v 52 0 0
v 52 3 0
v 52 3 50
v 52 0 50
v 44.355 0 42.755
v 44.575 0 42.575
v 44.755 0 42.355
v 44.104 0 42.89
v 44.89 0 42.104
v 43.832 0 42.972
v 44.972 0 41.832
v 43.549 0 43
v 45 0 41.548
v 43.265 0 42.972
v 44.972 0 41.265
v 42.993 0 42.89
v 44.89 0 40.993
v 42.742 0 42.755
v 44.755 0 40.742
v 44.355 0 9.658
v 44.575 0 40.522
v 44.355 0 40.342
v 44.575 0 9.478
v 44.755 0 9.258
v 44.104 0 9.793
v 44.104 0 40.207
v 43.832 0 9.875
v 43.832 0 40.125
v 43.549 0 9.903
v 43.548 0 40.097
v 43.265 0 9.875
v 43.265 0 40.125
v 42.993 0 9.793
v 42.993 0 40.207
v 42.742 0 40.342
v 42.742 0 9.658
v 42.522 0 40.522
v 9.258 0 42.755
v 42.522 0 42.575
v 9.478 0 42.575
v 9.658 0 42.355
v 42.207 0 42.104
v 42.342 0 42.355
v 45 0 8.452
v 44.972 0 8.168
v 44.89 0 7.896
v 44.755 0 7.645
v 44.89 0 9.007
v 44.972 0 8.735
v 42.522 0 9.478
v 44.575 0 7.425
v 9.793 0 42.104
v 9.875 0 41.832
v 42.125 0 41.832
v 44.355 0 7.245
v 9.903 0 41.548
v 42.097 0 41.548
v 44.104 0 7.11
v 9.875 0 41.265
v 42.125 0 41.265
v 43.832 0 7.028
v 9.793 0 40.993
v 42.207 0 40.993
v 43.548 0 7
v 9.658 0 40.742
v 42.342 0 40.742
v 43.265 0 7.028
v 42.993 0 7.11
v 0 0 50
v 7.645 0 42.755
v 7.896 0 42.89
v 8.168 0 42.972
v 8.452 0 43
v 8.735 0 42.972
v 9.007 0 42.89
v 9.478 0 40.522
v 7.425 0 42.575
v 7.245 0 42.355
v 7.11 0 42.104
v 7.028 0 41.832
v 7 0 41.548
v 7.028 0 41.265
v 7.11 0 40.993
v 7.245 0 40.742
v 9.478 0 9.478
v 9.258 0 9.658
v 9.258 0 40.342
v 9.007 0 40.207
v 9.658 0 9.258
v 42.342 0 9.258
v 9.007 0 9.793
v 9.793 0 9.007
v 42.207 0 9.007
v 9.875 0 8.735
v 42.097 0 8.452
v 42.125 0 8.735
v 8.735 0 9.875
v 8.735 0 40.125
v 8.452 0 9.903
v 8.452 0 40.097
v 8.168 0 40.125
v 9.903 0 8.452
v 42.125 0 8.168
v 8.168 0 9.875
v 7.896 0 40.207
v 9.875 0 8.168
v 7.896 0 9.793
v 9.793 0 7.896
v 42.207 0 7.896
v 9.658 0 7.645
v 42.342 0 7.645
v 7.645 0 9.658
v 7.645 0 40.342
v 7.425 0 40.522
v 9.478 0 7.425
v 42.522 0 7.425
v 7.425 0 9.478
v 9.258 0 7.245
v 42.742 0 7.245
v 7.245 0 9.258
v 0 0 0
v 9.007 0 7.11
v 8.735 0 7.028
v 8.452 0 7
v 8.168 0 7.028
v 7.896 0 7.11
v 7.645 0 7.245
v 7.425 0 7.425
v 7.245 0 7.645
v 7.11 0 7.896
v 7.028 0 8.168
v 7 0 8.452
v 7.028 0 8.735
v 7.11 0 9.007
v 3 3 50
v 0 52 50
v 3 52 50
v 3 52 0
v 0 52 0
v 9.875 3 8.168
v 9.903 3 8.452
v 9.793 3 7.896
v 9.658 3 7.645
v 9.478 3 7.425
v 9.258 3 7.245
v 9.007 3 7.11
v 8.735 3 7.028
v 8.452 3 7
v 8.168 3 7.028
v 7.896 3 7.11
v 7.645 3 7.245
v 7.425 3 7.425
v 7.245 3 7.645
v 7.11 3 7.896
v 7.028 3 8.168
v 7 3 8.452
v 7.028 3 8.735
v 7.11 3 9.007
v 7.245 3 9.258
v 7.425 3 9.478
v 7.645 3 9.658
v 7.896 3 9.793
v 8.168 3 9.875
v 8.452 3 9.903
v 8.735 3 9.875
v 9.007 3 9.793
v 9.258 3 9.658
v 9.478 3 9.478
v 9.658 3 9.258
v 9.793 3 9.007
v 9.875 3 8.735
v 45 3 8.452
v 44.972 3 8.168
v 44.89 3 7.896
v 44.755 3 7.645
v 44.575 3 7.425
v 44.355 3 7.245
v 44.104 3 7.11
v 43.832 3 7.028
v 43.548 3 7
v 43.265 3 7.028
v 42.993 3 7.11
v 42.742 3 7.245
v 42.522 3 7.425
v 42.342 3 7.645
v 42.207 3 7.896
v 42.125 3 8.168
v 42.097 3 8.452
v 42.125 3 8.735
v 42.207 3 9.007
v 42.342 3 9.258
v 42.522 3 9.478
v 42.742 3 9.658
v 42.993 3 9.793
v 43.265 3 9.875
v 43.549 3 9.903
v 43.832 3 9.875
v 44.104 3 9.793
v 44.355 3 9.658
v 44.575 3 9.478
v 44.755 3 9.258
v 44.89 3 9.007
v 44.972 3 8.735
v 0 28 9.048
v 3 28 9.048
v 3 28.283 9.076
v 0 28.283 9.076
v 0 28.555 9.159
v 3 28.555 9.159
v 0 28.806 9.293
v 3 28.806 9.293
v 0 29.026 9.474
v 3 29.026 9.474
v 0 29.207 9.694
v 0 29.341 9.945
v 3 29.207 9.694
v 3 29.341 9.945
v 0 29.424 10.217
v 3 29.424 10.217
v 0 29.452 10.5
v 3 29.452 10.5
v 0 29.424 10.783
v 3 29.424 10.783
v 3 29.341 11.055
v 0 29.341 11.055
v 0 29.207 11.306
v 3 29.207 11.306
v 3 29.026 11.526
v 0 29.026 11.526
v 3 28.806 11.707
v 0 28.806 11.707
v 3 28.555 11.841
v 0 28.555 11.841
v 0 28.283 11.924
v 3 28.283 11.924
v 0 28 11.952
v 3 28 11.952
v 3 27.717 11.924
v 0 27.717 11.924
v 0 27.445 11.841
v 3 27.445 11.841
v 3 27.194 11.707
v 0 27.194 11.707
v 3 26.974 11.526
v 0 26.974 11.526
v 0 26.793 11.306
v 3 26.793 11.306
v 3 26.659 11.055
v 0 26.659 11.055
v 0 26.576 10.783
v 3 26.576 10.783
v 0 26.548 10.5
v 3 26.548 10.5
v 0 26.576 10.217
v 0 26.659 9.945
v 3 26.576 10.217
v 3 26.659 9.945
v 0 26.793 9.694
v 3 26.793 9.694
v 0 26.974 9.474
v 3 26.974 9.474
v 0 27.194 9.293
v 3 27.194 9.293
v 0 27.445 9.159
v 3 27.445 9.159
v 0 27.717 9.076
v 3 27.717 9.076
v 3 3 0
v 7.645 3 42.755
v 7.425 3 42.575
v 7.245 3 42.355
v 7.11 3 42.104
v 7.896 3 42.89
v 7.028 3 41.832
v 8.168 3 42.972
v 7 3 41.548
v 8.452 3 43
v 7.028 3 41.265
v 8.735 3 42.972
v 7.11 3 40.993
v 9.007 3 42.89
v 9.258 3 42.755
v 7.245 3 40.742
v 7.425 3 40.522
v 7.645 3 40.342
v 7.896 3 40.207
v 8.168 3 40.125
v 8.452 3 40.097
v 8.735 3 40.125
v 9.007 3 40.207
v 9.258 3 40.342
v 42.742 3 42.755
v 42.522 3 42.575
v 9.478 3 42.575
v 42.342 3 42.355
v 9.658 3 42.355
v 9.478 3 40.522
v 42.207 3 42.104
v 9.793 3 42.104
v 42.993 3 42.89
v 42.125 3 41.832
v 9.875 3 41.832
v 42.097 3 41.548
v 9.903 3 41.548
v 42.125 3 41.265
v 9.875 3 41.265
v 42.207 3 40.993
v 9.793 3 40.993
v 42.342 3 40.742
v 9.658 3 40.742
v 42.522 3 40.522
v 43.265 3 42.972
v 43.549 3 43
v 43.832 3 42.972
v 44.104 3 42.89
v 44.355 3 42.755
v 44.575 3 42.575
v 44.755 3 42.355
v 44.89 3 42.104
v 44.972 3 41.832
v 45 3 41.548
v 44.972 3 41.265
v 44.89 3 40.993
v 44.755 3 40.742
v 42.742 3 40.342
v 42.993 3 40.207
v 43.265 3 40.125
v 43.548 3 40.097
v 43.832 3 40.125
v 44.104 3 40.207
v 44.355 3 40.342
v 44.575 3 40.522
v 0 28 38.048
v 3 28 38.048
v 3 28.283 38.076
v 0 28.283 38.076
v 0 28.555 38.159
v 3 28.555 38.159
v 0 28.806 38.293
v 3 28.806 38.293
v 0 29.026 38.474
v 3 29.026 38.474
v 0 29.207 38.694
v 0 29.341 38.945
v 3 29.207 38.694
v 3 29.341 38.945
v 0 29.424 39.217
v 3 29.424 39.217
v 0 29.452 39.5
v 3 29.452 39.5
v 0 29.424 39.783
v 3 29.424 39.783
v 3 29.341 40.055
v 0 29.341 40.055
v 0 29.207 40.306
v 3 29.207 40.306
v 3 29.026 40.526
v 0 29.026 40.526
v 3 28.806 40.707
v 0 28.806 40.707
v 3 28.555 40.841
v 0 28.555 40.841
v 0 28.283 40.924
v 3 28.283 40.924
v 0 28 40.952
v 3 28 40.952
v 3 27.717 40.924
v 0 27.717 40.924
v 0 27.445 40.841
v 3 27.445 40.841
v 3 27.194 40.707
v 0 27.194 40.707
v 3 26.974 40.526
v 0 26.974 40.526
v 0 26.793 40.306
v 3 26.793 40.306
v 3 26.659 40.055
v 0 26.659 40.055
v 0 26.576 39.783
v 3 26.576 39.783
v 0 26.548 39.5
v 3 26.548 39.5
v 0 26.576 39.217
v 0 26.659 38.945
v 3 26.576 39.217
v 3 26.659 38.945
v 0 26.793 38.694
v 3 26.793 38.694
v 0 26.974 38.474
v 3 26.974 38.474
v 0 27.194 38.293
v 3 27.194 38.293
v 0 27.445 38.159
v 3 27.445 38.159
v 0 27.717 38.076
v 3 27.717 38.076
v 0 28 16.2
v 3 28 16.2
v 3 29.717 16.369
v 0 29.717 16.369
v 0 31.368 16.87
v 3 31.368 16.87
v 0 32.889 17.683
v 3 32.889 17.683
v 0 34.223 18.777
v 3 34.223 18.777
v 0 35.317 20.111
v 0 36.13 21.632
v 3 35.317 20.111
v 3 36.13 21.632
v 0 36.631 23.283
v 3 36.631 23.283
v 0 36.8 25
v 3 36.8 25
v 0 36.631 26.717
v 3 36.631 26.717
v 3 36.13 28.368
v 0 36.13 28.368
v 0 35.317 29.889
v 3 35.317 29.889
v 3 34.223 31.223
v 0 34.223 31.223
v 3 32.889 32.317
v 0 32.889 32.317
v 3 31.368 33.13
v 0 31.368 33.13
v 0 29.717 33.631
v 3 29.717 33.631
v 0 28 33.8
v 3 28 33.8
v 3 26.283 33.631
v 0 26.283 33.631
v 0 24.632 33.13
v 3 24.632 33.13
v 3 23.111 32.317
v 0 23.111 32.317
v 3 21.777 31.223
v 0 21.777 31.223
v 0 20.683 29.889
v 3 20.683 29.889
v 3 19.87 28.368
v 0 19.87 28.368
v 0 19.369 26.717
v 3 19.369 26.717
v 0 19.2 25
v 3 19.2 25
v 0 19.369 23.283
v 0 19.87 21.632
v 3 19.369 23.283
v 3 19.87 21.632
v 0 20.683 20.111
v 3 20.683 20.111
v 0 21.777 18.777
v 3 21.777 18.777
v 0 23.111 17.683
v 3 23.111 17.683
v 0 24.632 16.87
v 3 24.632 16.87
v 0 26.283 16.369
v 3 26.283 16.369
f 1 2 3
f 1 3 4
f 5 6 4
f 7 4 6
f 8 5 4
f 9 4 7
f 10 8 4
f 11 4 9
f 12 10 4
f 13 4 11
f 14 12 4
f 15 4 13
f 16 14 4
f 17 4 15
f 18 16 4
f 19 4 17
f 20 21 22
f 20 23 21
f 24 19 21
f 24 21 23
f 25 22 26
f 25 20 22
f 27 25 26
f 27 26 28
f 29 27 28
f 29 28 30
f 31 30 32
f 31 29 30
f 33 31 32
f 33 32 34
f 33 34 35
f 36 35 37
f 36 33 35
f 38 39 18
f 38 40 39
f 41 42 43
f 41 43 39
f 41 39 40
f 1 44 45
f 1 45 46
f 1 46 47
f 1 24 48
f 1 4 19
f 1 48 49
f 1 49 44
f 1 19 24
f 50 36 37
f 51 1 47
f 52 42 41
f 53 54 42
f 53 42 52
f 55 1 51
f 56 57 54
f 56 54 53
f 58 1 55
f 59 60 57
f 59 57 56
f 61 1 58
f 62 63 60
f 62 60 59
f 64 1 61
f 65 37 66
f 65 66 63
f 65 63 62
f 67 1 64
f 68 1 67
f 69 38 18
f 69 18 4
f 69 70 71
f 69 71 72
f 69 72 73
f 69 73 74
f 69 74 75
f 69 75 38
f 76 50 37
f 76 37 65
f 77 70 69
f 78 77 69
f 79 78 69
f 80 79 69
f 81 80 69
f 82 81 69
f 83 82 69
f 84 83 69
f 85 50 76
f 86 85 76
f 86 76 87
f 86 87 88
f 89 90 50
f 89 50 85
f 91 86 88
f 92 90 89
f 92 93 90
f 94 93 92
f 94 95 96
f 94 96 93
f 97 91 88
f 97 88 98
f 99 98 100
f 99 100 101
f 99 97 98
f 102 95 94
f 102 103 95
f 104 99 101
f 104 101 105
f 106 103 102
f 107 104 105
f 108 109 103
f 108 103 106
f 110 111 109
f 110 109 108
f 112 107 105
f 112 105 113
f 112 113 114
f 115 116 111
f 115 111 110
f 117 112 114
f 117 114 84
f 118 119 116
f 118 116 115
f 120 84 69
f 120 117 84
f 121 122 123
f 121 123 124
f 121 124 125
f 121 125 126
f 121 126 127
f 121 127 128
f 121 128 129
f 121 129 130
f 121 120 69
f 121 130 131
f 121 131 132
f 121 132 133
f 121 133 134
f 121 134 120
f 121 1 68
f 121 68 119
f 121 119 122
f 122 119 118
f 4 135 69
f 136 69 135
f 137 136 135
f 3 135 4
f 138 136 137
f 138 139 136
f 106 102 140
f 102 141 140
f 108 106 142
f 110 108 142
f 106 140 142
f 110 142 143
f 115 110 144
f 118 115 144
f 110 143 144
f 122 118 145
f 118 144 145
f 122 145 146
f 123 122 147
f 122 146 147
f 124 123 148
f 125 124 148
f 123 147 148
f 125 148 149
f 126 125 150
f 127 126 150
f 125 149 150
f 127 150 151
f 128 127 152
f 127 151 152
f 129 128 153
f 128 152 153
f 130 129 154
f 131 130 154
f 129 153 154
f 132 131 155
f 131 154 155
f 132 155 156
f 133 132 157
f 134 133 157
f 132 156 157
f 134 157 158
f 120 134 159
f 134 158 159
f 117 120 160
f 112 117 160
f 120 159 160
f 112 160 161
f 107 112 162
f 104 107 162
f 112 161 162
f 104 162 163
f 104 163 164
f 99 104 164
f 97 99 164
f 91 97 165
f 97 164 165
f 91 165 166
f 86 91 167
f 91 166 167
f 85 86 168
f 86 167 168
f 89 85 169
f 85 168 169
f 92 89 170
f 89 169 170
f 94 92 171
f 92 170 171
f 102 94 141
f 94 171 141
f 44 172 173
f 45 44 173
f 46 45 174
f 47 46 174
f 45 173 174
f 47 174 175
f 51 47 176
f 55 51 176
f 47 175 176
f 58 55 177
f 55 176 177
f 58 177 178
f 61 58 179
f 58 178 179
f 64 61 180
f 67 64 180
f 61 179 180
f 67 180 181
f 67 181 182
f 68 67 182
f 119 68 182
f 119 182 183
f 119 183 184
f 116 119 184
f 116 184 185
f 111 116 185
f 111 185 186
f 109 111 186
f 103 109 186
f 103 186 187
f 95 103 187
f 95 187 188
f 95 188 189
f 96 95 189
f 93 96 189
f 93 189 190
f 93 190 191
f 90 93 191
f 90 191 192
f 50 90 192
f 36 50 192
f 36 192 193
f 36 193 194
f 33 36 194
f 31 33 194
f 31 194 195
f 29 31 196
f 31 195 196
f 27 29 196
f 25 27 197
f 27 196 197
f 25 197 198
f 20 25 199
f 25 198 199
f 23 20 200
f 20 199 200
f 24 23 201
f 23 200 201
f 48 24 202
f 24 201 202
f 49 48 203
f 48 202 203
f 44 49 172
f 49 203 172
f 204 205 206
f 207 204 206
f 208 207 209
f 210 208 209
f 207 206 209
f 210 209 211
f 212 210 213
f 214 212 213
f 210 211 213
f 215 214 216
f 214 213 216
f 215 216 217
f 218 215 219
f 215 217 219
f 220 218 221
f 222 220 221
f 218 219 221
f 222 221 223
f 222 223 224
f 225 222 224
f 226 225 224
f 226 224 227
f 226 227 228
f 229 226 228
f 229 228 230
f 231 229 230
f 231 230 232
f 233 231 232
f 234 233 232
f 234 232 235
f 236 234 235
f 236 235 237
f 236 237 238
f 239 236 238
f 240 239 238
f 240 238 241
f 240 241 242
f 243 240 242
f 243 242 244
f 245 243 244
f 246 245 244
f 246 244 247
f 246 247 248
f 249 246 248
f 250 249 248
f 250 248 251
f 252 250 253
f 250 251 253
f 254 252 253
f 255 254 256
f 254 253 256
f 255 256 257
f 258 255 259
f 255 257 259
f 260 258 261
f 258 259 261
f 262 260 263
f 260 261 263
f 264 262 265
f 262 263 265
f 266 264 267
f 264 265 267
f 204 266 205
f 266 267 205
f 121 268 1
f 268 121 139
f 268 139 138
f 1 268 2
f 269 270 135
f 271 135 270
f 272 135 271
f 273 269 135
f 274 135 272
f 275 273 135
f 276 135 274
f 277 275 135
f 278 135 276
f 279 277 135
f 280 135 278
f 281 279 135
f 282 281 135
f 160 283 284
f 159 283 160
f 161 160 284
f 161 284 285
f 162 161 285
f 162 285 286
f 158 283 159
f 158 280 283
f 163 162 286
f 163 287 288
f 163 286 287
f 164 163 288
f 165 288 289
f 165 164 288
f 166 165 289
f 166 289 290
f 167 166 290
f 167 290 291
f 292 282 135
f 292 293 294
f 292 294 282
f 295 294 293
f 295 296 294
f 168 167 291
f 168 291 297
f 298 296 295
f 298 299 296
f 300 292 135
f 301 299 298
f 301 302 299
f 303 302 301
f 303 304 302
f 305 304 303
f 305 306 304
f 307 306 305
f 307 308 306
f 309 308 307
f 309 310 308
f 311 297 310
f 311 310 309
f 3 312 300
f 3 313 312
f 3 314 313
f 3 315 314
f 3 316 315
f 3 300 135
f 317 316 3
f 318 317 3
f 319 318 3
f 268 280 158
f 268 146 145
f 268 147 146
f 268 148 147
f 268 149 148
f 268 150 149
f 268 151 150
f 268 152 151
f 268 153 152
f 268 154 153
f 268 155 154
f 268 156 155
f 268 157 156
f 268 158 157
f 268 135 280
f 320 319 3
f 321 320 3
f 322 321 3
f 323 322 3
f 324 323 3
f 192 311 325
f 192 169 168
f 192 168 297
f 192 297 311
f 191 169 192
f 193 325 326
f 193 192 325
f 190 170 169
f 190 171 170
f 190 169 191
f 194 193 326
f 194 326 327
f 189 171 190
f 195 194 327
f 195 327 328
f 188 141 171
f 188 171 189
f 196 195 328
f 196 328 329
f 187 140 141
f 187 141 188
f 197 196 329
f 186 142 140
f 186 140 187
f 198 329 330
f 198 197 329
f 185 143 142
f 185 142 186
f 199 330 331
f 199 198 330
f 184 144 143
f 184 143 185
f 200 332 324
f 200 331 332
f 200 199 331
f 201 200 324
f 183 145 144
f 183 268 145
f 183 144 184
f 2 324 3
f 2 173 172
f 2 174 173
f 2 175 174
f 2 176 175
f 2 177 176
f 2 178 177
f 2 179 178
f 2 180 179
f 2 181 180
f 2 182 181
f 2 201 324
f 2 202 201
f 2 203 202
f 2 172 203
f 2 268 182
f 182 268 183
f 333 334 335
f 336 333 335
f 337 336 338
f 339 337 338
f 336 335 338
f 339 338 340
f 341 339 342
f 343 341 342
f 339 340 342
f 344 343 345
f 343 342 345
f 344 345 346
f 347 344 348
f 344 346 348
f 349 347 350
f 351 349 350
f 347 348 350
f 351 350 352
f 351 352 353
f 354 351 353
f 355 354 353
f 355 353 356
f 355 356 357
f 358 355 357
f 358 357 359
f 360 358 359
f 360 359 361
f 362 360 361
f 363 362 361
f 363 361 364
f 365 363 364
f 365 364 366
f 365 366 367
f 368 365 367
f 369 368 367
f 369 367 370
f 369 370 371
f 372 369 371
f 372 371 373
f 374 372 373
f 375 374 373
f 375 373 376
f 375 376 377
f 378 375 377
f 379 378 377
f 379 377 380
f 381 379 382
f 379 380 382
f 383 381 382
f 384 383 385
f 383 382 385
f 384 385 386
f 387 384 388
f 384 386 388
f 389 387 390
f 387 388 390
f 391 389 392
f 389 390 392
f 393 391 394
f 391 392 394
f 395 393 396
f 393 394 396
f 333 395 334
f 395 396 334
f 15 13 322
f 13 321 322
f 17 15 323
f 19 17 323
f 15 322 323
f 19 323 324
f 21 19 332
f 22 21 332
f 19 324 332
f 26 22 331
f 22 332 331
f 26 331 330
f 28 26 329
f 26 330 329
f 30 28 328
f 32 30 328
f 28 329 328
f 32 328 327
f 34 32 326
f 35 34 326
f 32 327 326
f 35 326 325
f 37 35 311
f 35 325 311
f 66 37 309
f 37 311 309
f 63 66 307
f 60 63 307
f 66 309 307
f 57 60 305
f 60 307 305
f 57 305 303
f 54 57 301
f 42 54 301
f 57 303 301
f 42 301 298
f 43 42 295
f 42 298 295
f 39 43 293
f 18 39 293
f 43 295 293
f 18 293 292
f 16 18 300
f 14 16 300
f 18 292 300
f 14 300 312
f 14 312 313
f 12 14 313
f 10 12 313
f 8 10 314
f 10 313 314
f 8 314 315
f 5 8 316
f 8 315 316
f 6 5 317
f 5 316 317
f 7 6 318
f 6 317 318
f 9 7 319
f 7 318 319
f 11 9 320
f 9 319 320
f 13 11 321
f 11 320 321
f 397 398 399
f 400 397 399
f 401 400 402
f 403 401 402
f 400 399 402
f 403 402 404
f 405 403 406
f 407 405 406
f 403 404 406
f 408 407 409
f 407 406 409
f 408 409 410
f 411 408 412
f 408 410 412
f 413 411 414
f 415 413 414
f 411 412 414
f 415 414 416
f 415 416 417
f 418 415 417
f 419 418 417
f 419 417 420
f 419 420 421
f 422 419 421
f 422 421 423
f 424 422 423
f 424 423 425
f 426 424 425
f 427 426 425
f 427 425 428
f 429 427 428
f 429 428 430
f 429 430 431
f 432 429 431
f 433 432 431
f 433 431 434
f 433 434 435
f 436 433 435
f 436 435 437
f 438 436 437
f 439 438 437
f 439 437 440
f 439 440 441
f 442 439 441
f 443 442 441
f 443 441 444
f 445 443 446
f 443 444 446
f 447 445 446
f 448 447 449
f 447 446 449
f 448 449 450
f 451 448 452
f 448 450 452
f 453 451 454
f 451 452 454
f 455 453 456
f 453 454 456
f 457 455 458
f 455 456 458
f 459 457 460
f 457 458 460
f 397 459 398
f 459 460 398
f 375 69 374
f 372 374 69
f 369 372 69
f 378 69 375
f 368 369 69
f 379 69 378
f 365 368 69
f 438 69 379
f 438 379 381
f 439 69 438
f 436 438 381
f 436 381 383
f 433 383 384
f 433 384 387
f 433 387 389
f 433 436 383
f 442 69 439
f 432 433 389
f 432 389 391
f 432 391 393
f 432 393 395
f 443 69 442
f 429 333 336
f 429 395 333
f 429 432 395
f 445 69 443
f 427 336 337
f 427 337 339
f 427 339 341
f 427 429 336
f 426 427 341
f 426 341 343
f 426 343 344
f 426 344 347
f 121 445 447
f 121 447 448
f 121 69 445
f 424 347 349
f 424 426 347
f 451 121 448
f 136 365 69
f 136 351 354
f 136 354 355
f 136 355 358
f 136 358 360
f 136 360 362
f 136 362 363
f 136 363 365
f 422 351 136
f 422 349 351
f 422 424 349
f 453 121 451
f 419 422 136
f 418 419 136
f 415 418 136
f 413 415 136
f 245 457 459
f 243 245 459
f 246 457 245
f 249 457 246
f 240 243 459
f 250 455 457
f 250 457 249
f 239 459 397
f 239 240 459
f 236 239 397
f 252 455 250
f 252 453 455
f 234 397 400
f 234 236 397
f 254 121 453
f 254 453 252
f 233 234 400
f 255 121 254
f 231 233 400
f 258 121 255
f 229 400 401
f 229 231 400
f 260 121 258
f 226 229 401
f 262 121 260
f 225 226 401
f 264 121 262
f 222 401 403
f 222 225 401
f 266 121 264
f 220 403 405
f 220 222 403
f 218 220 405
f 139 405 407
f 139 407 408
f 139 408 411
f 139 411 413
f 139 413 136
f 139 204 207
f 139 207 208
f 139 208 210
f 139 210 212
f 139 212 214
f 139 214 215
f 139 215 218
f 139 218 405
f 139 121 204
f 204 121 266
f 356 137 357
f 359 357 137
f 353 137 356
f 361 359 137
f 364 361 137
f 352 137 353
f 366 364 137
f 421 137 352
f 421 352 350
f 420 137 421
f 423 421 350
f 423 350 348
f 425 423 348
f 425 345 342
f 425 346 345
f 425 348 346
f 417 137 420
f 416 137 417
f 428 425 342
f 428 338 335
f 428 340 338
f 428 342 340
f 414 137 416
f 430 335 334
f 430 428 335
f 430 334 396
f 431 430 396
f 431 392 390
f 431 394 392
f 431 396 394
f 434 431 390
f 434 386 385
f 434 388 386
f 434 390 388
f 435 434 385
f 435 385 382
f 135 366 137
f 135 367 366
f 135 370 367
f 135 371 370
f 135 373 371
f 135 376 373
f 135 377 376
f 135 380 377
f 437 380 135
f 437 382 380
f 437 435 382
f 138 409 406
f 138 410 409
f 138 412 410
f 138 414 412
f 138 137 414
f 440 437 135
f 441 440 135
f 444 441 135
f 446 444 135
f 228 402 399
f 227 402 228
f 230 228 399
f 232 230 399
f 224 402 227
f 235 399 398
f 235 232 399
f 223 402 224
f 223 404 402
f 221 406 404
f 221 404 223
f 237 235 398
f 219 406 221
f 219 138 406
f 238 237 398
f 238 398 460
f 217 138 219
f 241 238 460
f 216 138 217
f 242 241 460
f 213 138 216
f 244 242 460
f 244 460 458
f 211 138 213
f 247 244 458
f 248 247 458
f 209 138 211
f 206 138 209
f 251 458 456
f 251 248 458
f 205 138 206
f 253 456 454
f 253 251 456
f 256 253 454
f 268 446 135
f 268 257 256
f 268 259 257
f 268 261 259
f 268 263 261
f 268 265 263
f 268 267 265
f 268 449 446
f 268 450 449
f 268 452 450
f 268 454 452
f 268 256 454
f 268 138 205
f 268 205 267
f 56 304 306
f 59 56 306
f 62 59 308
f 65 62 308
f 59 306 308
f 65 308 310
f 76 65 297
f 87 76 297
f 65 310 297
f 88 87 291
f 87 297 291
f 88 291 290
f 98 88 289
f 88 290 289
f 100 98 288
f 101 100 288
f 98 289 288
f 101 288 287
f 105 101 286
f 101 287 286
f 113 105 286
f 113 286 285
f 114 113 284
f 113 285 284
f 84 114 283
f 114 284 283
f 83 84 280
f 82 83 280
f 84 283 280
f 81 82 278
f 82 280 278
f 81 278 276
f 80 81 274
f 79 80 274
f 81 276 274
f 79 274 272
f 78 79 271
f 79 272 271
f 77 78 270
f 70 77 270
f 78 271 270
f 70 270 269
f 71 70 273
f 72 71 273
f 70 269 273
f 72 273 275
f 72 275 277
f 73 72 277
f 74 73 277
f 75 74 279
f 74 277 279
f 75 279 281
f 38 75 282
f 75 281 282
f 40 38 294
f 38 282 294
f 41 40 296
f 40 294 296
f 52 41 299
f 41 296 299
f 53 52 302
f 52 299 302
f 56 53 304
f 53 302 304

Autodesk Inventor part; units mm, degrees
ref_plane "YZ Plane" through (0, 0, 0) normal (1, 0, 0) x (0, 1, 0)
ref_plane "XZ Plane" through (0, 0, 0) normal (0, 1, 0) x (-1, 0, 0)
ref_plane "XY Plane" through (0, 0, 0) normal (0, 0, 1) x (1, 0, 0)
sketch "Sketch1" plane through (0, 0, 0) normal (0, 0, 1) x (1, 0, 0)
  line L0 (0, 0) -> (0, 52)
  line L1 (0, 52) -> (3, 52)
  line L2 (3, 52) -> (3, 3)
  line L3 (3, 3) -> (52, 3)
  line L4 (52, 3) -> (52, 0)
  line L5 (52, 0) -> (0, 0)
  dimension "d0" = 3
  dimension "d1" = 3
  dimension "d2" = 52
  dimension "d3" = 52
extrude "Extrusion1" add sketch "Sketch1" along normal blind 50
sketch "Sketch2" plane through (3, 3, 0) normal (1, 0, 0) x (0, 0, -1)
  circle A0 centre (-25, 25) radius 8.8
  line L0 (0, 49) -> (-50, 49) projected
  line L1 (0, 0) -> (0, 49) projected
  circle A1 centre (-10.5, 25) radius 1.4515
  circle A2 centre (-39.5, 25) radius 1.4515
  point P0 (0, -3)
  dimension "d6" = 17.6
  dimension "d7" = 24
  dimension "d8" = 25
  dimension "d9" = 2.903
  dimension "d10" = 2.903
  dimension "d11" = 29
  dimension "d12" = 14.5
  dimension "d13" = 14.5
extrude "Extrusion2" cut sketch "Sketch2" against normal through all
sketch "Sketch3" plane through (3, 3, 0) normal (0, 1, 0) x (1, 0, 0)
  circle A0 centre (5.4515, -41.5485) radius 1.4515
  circle A1 centre (5.4515, -8.4515) radius 1.4515
  circle A2 centre (40.5485, -41.5485) radius 1.4515
  circle A3 centre (40.5485, -8.4515) radius 1.4515
  line L0 (49, -50) -> (0, -50) projected
  line L1 (49, 0) -> (0, 0) projected
  line L2 (49, 0) -> (49, -50) projected
  line L3 (-3, 0) -> (-3, -50) projected
  dimension "d16" = 2.903
  dimension "d17" = 2.903
  dimension "d18" = 2.903
  dimension "d19" = 2.903
  dimension "d20" = 7
  dimension "d21" = 7
  dimension "d22" = 7
  dimension "d23" = 7
  dimension "d24" = 7
  dimension "d25" = 7
  dimension "d26" = 7
  dimension "d27" = 7
extrude "Extrusion3" cut sketch "Sketch3" against normal through all
equation "\"BendRadius\" = Thickness"
equation "\"BendReliefWidth\" = Thickness"
equation "\"BendReliefDepth\" = 0.5 * Thickness"
equation "\"CornerReliefSize\" = 4 * Thickness"
equation "\"MinimumRemnant\" = 2 * Thickness"
equation "\"TransitionRadius\" = BendRadius"
equation "\"JacobiRadiusSize\" = BendRadius"
equation "\"GapSize\" = Thickness"
equation "\"Thickness\" = 0.5"
properties part number "dc motor clamp"
